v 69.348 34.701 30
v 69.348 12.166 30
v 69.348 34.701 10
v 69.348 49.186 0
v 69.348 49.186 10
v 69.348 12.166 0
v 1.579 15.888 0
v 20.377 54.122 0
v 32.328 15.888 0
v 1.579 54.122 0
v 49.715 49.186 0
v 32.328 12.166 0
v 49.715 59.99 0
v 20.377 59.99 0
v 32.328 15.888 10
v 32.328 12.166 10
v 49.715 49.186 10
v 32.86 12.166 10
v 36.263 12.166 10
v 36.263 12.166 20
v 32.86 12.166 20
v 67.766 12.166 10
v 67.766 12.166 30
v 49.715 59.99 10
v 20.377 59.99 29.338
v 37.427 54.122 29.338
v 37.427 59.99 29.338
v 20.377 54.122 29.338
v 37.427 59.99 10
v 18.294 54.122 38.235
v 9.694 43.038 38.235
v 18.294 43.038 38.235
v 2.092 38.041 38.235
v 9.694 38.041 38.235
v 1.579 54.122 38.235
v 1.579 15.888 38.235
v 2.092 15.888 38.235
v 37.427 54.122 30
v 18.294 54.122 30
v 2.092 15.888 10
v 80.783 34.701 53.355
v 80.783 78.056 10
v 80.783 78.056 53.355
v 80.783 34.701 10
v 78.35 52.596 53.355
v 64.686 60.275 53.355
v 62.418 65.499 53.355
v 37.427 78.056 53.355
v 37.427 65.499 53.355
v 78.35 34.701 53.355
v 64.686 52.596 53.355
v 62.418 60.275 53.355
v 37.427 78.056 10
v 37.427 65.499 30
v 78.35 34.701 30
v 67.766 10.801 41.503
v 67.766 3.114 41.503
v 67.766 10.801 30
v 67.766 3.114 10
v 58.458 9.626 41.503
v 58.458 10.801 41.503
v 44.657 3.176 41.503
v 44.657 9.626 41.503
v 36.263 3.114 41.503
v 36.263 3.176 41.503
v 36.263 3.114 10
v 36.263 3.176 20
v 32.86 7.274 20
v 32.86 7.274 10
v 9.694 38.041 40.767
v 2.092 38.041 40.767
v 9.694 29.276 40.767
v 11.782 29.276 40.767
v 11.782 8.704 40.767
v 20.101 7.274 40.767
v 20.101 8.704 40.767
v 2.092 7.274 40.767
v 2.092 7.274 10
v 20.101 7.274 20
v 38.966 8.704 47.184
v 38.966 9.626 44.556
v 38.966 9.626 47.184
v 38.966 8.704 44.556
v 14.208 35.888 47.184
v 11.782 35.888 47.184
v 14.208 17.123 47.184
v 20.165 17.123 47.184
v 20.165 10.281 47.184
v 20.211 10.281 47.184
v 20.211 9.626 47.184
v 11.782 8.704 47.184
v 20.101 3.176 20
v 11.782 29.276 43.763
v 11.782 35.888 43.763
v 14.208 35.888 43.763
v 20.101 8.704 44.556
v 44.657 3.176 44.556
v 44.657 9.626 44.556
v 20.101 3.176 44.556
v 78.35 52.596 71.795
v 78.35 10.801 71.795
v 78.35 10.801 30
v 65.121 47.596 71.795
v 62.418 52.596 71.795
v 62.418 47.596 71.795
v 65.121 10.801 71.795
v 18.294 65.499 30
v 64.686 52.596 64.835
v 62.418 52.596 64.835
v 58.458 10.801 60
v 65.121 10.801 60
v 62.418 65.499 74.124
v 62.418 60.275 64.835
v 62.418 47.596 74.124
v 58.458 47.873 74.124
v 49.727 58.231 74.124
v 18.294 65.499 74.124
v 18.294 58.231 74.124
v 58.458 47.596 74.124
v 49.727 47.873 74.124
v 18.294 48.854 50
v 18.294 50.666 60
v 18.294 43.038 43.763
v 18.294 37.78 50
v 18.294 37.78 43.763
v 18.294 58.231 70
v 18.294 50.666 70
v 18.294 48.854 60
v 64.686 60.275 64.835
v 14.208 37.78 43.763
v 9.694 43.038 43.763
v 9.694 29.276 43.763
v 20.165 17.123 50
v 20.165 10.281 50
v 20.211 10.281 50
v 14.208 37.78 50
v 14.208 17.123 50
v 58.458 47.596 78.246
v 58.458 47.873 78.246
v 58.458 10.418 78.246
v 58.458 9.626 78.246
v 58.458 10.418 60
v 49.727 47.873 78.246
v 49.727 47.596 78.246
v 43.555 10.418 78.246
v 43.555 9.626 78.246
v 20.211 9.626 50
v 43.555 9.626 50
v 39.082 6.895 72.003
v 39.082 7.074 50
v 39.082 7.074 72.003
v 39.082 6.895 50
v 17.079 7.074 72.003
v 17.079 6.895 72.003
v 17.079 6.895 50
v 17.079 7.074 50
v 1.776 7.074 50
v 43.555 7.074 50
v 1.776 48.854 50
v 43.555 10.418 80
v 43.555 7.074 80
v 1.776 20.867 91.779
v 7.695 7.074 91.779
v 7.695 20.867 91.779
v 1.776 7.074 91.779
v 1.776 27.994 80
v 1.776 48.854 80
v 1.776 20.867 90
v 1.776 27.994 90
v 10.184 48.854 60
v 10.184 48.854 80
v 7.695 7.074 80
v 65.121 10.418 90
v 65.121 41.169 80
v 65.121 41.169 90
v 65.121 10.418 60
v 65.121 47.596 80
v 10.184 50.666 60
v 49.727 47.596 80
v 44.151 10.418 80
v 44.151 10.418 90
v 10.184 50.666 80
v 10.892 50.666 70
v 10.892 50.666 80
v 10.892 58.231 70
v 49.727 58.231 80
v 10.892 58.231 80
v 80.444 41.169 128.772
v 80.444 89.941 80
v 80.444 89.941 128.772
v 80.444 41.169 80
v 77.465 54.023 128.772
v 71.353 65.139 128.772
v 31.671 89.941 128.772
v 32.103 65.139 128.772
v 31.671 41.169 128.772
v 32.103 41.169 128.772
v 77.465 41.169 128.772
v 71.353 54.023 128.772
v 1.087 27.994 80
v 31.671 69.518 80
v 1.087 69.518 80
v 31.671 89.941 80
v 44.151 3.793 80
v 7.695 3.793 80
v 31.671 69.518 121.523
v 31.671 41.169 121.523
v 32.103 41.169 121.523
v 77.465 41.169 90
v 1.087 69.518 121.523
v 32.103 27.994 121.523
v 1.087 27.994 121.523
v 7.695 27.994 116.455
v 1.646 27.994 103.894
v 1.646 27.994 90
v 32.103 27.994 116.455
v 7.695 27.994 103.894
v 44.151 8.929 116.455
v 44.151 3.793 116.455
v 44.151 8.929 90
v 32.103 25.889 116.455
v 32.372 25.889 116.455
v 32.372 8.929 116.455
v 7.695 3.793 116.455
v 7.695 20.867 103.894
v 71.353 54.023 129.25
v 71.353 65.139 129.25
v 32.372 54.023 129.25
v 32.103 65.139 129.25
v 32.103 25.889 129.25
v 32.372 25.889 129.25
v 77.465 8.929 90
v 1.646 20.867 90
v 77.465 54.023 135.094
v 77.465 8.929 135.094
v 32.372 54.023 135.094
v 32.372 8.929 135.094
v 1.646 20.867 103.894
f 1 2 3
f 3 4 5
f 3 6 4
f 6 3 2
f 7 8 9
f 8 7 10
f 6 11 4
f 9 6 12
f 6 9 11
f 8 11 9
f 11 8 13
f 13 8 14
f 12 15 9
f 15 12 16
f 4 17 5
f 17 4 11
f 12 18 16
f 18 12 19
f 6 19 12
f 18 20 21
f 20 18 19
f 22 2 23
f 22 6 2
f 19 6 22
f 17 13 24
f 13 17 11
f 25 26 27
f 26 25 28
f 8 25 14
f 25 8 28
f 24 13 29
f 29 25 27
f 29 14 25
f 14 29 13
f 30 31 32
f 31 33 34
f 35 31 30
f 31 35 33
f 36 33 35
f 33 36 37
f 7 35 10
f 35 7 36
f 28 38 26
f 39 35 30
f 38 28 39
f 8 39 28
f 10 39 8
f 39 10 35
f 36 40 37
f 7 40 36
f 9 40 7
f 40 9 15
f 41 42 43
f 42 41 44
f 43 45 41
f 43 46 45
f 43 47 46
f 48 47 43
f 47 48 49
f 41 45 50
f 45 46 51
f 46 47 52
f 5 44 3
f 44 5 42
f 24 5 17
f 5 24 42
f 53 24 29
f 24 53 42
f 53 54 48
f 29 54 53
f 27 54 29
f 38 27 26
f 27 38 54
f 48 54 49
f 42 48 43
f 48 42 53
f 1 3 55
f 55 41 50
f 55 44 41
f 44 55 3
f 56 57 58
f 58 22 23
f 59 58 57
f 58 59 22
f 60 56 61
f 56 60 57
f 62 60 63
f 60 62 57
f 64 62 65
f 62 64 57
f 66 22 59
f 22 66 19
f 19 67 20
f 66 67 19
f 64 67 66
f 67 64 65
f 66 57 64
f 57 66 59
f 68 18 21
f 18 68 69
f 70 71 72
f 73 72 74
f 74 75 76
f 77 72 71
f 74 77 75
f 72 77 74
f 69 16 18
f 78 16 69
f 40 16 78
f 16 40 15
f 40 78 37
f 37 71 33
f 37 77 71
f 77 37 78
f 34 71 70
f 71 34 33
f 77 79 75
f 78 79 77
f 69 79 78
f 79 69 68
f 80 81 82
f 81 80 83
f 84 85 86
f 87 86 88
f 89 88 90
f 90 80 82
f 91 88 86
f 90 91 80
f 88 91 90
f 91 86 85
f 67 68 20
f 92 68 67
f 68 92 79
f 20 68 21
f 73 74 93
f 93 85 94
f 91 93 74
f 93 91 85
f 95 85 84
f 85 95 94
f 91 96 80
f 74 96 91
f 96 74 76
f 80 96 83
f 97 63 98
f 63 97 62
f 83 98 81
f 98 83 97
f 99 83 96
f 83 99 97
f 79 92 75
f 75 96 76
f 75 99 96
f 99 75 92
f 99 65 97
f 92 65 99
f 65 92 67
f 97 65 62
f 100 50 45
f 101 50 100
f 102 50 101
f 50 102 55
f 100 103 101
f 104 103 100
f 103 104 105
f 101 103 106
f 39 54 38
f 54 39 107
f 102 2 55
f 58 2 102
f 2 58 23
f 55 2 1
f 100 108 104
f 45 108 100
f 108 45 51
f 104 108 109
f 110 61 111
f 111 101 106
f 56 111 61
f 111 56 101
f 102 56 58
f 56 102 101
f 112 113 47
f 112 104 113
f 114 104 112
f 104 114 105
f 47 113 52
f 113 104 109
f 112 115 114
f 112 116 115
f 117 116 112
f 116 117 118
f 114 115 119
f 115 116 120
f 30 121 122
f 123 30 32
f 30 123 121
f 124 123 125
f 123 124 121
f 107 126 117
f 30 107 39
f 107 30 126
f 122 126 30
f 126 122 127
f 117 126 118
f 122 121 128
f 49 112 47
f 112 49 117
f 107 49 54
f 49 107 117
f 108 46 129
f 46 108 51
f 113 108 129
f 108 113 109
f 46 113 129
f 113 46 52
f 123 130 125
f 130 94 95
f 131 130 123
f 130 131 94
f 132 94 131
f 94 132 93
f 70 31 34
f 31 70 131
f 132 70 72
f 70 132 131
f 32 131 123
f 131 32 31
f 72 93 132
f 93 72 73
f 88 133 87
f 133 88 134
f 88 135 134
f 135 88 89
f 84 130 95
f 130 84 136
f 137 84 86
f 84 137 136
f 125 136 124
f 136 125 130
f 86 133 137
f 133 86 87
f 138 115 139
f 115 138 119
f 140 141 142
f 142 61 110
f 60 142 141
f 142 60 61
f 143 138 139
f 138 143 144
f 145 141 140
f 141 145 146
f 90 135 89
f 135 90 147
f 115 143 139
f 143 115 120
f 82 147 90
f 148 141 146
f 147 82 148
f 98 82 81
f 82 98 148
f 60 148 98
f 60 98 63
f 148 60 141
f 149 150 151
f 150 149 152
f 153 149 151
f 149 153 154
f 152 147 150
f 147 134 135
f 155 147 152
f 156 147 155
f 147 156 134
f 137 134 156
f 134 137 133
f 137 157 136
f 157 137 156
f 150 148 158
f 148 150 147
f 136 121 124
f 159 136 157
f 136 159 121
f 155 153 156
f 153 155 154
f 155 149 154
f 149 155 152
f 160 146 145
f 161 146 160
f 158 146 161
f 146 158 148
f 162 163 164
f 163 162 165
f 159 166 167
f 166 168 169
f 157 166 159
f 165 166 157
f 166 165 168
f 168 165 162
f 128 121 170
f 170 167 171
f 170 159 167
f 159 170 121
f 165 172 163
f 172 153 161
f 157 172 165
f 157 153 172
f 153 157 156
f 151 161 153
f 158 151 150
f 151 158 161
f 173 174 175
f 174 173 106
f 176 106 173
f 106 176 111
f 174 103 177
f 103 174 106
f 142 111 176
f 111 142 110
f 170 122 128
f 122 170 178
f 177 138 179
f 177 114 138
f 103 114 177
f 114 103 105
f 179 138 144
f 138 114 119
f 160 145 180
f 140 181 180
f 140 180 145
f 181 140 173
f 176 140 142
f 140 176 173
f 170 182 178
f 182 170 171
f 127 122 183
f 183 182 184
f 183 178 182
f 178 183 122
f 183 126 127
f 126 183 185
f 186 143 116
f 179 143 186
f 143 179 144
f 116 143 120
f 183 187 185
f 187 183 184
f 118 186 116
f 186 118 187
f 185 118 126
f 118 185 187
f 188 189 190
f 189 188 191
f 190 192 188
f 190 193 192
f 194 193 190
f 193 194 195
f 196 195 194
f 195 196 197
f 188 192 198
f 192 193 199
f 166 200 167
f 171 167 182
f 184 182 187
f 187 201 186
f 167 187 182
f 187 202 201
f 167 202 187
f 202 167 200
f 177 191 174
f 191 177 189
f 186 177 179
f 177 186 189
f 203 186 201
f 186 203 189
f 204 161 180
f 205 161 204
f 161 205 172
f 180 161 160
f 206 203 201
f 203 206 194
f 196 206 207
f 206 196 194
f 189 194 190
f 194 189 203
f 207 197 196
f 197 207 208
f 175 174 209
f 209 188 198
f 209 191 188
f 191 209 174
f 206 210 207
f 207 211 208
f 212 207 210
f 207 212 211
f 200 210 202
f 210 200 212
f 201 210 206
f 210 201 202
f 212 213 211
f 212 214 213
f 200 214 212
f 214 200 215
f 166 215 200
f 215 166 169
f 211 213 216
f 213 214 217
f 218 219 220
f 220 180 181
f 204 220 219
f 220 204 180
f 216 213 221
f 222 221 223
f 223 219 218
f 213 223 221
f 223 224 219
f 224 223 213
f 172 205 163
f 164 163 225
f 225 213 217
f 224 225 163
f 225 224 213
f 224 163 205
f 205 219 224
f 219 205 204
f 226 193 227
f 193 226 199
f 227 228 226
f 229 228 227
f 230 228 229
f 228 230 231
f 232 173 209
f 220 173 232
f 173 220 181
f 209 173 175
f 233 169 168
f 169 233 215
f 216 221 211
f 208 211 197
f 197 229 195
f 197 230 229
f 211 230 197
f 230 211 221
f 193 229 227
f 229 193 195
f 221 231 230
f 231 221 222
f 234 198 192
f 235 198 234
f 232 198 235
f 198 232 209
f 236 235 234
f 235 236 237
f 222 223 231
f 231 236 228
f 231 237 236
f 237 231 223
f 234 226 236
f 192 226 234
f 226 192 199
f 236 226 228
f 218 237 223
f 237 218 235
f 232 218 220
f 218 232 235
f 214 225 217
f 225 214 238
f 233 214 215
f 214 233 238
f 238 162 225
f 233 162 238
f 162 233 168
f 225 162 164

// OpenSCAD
/* Random experimental art

By Julián Caro Linares

jcarolinares@gmail.com

CC-BY-SA


*/

//--Cubes

//--Rules
/*
    - Between 1 and 5 cube per "layer"
    -Layer distance (Z axe) must be lower than the cubes height
    -Relatives positions related to the last generated cube, always inside the area of the cube to ensure the fusion betweeen solids

*/

//Parameters
/* [Cube's sizes] */
//Min Size of a Cube
mincubesize=10;  // [0:1000]
//Max size of a Cube
maxcubesize=50; // [0:1000]
/* [Cubes per layer] */
//Min of cubes per layer
mincubeslayer=2; // [0:100]
//Max of cubes per layer
maxcubeslayer=5; // [0:100]
/* [Layer's parameters] */
//Number of layers
numberoflayers=10; //[0:100]
//Distance between layers (It must be equal or less than mincubesize)
distanceoflayers=10; // [0:100] 
// Mode of rotated cubes
rotated_cubes="false"; // [false,true]




//Layer tree generator
for (layer =[0:1:numberoflayers-1])
{

//Random layer generator
//Get the number of cubes in this layer
cubesperlayer =round(rands(mincubeslayer,maxcubeslayer,1)[0]);
echo("Cubes per layer: ");
echo(cubesperlayer);


//Get the cubes sizes of the layer
cubessizes = rands(mincubesize,maxcubesize,cubesperlayer);
echo("Cubes sizes: ");
echo(cubessizes);



//If random sign is less than 0.5, then the number is negative
randomsign=rands(0,1,1);
echo("Randomsign: ");
echo(randomsign);



//Translation of the layer
translate([0,0,layer*distanceoflayers])
    {
//Layer construction
for (index =[0:1:cubesperlayer-1])
{
//cube(cubessizes[index]);

//Get the relative translation of the cubes based in the last cube generated
    if(index==0)
    {
        relativetranslationXY=rands(1,cubessizes[index],2);
        
        echo("Relative translation XY: ");
        echo(relativetranslationXY);
            
        translate([relativetranslationXY[0],relativetranslationXY[1],0])
        {
            randcolor=rands(0,1,3);
            
            //If we want to generated rotated cubes
            if(rotated_cubes=="true")
            {
                relativerotationZ=rands(0,360,1)[0];
                rotate([0,0,relativerotationZ])
                color(randcolor,a=1.0)
                cube(cubessizes[index]);
            }
            else
            {
                color(randcolor,a=1.0)
                cube(cubessizes[index]);   
            }
            
        }
    }
    else
    {
        relativetranslationXY=rands(1,cubessizes[index-1],2);
        
        echo("Relative translation XY: ");
        echo(relativetranslationXY); 
        
        
        translate([relativetranslationXY[0],relativetranslationXY[1],0])
        {
            randcolor=rands(0,1,3);
            
            //If we want to generated rotated cubes
            if(rotated_cubes==true)
            {
                relativerotationZ=rands(0,360,1)[0];
                rotate([0,0,relativerotationZ])
                color(randcolor,a=1.0)
                cube(cubessizes[index]);
            }
            else
            {
                color(randcolor,a=1.0)
                cube(cubessizes[index]);   
            }
        }
    }
}

}

}
